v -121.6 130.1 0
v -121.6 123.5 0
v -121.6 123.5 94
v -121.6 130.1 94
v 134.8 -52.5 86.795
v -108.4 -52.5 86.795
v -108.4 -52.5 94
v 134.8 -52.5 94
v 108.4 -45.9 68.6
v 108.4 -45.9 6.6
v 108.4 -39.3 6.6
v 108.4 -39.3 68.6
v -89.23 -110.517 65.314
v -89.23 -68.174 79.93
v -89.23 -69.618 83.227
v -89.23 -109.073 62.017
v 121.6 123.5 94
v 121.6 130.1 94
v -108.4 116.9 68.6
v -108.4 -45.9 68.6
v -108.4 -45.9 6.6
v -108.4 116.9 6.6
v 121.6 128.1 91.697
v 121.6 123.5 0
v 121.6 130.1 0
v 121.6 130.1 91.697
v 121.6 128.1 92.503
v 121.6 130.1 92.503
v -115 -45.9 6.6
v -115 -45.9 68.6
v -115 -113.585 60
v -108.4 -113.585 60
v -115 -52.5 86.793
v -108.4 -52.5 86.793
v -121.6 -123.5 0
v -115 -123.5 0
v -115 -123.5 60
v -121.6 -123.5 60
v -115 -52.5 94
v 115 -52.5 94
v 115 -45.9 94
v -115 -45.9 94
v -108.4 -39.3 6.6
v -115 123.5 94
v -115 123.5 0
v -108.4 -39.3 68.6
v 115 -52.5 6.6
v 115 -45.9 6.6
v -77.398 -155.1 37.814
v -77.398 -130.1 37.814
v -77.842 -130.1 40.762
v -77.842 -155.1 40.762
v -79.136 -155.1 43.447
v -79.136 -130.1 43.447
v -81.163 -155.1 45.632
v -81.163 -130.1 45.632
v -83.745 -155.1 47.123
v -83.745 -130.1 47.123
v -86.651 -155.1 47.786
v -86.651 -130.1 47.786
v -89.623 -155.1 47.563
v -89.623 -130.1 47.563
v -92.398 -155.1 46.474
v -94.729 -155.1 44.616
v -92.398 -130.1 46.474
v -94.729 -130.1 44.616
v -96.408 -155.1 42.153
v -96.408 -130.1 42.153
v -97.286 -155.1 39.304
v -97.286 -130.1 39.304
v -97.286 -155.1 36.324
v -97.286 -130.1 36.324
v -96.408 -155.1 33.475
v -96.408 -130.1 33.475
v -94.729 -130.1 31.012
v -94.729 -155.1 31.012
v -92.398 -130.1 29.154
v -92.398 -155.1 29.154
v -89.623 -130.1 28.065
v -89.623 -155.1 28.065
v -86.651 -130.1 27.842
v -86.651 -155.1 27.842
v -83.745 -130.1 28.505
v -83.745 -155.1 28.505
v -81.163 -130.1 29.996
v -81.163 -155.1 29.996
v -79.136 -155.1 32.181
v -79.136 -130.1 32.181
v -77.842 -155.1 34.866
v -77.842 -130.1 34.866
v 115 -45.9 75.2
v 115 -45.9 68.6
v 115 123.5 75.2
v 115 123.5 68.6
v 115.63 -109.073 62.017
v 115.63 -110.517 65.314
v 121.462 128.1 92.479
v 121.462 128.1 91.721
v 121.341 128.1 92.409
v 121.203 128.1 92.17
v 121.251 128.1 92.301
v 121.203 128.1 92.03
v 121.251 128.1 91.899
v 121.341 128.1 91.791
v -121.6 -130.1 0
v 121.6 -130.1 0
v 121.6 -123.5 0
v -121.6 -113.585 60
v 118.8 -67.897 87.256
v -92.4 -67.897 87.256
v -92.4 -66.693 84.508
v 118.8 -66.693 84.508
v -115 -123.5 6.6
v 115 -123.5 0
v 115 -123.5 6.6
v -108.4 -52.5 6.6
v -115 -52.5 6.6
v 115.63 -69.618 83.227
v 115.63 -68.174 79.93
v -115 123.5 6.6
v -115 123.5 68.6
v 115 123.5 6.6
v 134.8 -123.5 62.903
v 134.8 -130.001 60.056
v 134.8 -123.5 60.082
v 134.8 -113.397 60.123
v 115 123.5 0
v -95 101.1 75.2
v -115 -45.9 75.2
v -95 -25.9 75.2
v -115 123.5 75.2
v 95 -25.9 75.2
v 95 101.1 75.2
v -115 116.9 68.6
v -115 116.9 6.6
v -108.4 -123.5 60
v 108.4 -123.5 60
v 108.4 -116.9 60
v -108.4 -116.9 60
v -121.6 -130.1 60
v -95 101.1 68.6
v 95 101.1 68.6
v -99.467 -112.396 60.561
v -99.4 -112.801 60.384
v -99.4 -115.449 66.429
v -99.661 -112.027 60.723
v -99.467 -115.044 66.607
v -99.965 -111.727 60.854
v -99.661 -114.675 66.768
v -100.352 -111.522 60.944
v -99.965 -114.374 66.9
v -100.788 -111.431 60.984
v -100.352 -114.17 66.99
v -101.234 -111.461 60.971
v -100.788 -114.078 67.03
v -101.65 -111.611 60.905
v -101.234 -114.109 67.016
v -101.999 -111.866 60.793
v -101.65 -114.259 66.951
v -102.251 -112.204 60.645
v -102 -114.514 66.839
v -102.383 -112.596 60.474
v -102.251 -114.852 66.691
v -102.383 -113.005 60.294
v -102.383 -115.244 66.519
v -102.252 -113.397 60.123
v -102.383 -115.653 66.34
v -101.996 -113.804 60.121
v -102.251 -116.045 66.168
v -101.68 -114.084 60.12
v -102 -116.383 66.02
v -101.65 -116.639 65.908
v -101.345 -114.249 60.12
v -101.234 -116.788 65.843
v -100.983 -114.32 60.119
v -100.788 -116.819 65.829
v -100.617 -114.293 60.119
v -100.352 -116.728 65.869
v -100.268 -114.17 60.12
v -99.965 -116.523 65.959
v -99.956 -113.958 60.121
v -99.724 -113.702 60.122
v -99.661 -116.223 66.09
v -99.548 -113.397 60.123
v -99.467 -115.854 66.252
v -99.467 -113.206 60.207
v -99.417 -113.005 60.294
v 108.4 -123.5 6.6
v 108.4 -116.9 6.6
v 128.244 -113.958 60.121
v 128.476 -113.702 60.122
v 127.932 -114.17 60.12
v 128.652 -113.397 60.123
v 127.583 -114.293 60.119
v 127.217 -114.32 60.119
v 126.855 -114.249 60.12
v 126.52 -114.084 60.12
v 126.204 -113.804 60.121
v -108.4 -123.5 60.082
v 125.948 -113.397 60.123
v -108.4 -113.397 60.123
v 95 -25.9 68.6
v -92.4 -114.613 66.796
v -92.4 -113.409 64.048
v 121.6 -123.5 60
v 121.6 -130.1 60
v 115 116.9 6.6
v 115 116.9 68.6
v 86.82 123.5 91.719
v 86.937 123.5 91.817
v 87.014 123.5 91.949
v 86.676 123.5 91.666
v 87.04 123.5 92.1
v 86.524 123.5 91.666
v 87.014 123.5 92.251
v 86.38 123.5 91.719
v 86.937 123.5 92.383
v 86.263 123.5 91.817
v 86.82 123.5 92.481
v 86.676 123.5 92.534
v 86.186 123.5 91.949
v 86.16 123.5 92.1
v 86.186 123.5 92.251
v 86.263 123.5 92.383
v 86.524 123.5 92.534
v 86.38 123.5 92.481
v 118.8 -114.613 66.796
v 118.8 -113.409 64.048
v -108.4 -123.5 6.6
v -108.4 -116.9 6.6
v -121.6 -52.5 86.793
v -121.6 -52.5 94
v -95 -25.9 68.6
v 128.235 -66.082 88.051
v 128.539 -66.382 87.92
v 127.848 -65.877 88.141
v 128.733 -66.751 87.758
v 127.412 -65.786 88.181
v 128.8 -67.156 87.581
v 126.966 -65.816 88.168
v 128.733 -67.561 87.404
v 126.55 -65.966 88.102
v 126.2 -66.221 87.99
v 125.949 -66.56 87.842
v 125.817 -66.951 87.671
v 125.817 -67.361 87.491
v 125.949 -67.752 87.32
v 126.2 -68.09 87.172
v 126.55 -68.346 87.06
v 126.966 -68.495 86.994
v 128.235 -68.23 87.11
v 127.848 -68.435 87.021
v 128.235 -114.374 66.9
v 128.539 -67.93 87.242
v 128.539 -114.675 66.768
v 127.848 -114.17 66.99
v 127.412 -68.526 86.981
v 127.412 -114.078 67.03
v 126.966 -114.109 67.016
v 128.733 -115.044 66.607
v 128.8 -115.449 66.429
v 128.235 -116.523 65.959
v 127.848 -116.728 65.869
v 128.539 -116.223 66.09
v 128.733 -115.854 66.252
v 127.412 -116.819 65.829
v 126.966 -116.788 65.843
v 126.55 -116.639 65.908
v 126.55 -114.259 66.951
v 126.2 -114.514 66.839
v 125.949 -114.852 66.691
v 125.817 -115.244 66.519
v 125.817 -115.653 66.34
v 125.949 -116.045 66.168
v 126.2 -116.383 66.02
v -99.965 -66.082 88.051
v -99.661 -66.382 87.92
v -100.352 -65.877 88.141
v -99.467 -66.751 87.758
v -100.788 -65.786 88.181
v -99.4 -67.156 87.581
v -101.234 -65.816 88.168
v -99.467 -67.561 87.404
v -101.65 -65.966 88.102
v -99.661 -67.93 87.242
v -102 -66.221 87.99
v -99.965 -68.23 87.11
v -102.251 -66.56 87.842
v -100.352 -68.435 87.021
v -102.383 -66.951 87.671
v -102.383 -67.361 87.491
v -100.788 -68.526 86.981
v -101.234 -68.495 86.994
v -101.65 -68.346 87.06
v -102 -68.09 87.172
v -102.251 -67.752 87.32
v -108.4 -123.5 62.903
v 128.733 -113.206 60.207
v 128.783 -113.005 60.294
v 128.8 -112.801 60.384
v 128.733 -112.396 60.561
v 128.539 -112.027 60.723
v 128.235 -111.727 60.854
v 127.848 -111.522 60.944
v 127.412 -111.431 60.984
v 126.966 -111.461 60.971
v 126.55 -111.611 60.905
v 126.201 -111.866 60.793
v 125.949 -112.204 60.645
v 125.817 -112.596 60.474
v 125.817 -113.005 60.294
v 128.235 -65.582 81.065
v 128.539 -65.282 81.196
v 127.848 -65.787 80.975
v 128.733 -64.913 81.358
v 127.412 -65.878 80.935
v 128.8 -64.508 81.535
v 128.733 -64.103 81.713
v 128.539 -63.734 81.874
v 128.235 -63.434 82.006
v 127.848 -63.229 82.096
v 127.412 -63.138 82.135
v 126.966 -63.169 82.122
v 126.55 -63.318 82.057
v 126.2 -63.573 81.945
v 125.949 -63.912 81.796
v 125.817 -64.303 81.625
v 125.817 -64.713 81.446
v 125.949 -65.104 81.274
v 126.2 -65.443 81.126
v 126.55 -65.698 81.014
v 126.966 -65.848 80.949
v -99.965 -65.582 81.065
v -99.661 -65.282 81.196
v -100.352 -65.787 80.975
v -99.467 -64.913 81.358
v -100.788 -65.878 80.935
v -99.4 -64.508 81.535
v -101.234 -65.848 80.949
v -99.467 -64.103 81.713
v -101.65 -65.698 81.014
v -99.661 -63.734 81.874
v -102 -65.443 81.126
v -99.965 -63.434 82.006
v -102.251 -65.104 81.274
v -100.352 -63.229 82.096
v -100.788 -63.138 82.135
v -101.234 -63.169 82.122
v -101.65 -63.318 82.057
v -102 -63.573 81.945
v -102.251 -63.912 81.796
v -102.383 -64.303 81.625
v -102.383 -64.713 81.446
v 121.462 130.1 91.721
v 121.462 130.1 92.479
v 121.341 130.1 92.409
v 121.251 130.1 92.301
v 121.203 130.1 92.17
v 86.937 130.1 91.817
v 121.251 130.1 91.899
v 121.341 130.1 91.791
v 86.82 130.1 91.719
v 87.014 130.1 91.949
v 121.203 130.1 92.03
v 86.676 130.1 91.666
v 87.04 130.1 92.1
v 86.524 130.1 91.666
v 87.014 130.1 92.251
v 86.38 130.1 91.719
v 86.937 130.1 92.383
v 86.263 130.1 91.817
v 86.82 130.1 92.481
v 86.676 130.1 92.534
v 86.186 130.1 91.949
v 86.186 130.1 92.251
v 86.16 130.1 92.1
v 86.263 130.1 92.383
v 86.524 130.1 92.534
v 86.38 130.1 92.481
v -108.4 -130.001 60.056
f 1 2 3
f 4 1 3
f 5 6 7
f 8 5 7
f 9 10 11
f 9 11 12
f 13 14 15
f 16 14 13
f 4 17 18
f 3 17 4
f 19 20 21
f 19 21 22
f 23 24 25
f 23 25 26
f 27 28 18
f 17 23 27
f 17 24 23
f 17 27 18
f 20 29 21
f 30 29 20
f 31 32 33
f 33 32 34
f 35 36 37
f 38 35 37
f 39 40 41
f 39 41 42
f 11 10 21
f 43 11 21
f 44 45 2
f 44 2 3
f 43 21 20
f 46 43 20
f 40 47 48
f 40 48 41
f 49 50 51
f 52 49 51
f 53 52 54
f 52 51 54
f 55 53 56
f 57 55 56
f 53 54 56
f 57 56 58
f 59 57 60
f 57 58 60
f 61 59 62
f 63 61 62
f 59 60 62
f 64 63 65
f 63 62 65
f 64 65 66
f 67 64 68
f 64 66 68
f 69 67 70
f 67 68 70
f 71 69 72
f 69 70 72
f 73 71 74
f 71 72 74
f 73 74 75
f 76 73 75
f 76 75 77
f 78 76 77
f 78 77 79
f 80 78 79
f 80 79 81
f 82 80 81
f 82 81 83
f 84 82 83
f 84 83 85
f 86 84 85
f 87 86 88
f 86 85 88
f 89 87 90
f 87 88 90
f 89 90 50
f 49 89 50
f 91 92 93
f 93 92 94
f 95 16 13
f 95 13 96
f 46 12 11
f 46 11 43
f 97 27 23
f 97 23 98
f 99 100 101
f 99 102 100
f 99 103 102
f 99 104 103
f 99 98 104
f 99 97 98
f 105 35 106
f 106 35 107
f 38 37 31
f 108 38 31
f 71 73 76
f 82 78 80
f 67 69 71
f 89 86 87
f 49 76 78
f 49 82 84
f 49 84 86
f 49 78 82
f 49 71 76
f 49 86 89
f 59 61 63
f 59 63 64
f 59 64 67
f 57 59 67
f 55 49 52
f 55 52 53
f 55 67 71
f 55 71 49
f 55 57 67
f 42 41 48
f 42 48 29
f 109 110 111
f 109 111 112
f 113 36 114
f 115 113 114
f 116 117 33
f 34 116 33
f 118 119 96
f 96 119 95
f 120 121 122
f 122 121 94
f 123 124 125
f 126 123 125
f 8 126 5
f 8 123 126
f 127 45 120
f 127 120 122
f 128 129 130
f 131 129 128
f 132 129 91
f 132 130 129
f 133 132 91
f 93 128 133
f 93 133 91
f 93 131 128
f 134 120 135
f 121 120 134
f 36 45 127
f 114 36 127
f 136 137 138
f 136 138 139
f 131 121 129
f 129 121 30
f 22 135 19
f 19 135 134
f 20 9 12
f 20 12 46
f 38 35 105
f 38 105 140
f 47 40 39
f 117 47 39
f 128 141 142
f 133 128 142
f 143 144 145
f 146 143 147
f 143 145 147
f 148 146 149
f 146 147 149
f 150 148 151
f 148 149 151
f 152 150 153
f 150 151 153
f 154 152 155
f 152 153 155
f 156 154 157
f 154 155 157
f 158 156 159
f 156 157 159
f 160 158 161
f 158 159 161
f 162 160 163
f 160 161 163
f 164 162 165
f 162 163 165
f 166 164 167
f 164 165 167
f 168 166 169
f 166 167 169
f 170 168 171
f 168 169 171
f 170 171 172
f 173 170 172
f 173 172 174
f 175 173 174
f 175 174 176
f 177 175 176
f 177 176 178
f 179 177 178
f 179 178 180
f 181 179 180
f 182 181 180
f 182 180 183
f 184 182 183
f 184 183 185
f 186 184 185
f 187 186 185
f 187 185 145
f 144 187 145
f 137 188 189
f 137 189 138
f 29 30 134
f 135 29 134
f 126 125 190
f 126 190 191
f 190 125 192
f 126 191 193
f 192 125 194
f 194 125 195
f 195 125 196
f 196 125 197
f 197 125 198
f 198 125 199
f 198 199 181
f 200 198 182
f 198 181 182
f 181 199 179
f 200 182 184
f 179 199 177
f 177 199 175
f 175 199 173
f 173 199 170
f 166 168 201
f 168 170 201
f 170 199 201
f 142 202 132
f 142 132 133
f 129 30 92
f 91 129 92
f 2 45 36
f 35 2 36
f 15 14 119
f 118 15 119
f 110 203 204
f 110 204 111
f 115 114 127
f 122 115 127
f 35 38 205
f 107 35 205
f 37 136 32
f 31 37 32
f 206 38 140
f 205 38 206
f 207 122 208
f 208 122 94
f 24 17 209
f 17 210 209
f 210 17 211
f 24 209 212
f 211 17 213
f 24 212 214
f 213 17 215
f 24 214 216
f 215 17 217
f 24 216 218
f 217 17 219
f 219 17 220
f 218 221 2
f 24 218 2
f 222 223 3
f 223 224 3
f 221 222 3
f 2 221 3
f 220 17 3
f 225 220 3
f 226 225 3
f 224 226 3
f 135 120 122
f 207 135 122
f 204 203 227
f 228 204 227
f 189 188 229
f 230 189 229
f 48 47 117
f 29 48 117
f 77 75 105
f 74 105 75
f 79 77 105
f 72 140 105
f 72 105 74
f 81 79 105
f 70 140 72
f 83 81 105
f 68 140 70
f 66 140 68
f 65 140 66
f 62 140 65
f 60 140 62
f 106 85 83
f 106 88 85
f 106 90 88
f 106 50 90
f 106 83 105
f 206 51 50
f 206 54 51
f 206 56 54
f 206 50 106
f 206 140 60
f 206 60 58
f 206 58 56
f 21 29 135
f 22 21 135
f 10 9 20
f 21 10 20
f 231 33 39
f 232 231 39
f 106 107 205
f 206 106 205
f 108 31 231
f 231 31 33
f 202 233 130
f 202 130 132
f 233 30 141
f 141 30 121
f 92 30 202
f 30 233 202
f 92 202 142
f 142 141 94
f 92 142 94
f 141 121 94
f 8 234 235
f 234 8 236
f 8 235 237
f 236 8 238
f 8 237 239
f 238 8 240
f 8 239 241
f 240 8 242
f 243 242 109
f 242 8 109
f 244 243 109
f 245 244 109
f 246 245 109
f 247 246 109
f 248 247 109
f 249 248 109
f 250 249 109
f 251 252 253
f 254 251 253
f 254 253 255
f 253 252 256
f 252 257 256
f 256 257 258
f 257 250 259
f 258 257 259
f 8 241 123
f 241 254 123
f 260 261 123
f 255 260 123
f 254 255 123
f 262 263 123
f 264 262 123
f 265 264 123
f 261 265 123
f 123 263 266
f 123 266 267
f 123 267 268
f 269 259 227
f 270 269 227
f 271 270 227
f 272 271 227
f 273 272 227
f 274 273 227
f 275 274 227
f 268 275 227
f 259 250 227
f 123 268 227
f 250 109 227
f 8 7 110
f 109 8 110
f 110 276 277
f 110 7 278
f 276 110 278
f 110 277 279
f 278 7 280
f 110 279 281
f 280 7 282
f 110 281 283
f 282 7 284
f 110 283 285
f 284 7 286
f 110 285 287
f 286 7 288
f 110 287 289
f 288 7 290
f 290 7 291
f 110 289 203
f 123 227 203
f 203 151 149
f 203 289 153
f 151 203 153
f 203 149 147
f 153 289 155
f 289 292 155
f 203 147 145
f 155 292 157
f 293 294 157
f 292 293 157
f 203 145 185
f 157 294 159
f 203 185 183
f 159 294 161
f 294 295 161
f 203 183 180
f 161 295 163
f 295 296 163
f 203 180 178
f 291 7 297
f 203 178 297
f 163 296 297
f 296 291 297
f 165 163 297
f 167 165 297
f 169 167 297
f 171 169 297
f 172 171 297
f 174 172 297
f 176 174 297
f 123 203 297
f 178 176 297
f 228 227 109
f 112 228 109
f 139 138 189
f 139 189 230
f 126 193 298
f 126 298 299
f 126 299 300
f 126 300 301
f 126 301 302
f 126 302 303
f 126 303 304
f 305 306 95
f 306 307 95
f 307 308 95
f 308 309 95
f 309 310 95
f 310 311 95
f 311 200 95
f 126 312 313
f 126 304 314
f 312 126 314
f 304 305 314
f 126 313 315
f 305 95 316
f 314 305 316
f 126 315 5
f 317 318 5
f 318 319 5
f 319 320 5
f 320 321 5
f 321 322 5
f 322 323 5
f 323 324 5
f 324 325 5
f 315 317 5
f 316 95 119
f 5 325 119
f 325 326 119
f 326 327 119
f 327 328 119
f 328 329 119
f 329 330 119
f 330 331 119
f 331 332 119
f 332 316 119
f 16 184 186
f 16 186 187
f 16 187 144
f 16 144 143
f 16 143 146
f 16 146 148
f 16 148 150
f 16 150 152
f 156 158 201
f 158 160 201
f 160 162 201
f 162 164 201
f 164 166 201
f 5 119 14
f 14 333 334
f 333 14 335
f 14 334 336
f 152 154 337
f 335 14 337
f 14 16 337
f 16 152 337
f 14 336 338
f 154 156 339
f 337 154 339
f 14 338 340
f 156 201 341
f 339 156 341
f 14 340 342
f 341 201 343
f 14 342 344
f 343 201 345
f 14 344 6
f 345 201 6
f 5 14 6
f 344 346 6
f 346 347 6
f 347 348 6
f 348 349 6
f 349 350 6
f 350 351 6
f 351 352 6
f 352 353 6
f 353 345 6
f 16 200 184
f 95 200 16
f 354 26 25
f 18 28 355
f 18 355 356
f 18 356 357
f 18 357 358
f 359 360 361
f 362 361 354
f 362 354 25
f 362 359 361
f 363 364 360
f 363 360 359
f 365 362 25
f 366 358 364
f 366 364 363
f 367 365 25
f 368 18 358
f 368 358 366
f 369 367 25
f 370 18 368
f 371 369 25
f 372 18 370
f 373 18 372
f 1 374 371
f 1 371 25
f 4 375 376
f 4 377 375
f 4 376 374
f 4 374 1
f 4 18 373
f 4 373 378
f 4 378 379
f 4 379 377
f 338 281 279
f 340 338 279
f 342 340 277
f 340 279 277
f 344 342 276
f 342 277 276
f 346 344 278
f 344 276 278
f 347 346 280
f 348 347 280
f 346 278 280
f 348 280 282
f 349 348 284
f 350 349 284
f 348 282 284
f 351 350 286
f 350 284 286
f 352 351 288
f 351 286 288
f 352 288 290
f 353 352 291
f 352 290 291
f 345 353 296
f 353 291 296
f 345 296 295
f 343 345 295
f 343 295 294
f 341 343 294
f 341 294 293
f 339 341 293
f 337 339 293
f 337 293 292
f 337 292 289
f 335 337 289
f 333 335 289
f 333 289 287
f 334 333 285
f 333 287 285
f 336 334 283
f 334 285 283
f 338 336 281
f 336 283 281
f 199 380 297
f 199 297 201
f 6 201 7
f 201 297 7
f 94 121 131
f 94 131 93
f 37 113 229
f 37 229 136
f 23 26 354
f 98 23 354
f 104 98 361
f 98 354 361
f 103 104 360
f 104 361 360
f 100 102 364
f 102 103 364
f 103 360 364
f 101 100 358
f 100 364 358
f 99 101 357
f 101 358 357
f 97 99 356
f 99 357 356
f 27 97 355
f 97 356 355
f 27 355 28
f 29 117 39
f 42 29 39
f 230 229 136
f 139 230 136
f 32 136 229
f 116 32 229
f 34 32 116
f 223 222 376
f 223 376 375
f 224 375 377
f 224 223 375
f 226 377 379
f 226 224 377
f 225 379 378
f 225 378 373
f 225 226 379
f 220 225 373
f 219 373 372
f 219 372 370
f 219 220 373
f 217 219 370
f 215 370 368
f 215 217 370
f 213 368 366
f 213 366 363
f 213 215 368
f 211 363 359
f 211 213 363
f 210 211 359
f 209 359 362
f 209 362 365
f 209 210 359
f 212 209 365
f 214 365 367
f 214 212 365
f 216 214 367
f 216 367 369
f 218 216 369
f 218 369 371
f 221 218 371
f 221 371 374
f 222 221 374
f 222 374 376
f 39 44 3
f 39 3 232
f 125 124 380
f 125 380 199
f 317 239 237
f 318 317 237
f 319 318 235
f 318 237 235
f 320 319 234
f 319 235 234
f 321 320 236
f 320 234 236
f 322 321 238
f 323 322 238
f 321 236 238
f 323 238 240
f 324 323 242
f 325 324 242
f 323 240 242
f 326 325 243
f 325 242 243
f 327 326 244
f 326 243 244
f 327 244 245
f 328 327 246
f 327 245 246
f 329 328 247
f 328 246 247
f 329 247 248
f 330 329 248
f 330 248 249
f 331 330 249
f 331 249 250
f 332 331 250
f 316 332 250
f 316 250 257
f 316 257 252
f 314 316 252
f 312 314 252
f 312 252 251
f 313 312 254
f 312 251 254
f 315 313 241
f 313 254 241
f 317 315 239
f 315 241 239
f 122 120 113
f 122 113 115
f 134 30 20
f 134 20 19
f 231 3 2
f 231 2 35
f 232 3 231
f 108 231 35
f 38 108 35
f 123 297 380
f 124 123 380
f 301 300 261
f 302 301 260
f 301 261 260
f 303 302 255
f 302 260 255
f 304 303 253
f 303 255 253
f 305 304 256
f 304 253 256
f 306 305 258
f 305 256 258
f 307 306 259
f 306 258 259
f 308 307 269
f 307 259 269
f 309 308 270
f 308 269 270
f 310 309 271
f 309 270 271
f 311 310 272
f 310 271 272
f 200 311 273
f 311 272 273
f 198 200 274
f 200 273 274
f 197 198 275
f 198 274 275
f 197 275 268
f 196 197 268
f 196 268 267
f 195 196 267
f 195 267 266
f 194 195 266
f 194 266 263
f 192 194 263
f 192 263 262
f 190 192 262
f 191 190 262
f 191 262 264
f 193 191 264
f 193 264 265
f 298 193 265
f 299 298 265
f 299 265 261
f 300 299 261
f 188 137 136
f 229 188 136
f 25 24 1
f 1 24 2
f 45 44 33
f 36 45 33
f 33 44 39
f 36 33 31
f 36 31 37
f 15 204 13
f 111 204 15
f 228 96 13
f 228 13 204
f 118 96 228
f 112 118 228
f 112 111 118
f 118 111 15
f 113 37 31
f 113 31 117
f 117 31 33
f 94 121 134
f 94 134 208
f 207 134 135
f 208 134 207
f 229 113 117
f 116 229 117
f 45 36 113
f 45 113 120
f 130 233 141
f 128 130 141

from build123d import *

# Parameters (mm, degrees)
F0_W      = 230
F0_H      = 247
F1_DEPTH  = 6.6
F2_W      = 243.2
F2_H      = 94
F2_R      = 0.4403166593
F3_DEPTH  = 6.6
F4_W      = 247
F4_H      = 94
F5_DEPTH  = 6.6
F6_W      = 230
F6_H      = 62
F7_DEPTH  = 6.6
F8_W      = 243.2
F8_H      = 60
F9_DEPTH  = 6.6
F10_W     = 71
F10_H     = 87.4
F11_DEPTH = 6.6
F12_W     = 230
F12_H     = 87.4
F13_DEPTH = 6.6
F14_R     = 0.402989406
F15_DEPTH = 2
F16_W     = 162.8
F16_H     = 62
F17_DEPTH = 6.6
F18_W     = 216.8
F18_H     = 62
F19_DEPTH = 6.6
F20_W     = 230
F20_H     = 162.8
F20_W_2   = 190
F20_H_2   = 127
F20_H_3   = 6.6
F21_DEPTH = 6.6
F22_W     = 216.8
F22_H     = 53.4
F23_DEPTH = 6.6
F25_DEPTH = 243.2
F27_DEPTH = 25
F28_DEPTH = 25
F29_W     = 204.86
F29_H     = 44.65
F30_DEPTH = 37.7334511403
F31_W     = 211.2
F31_H     = 51
F32_DEPTH = 3
F33_R     = 1.5
F34_DEPTH = 6.6
F35_R     = 10
F36_DEPTH = 25


with BuildPart() as f1:
    # F0 (on Top) → F1 (new body)
    with BuildSketch(Plane.XY):
        Rectangle(F0_W, F0_H)
    extrude(amount=F1_DEPTH)

    # F26 (on face) → F28 (cut)
    with BuildSketch(Plane.YZ.offset(-108.4)):
        Polygon((-52.5, 86.7930374113), (-52.5, 94), (-123.5, 62.8581471056), (-130.0162610969, 60), (-113.585178928, 60), align=None)
        Polygon((-123.5, 62.8581471056), (-52.5, 94), (-123.5, 94), align=None)
    extrude(amount=-F28_DEPTH, mode=Mode.SUBTRACT)


with BuildPart() as f3:
    # F2 (on face) → F3 (new body)
    with BuildSketch(Plane(origin=(0, 123.5, 0), x_dir=(-1, 0, 0), z_dir=(0, 1, 0))):
        with Locations((0, 47)):
            Rectangle(F2_W, F2_H)
        with Locations((-86.6, 92.1)):
            Circle(F2_R, mode=Mode.SUBTRACT)
    extrude(amount=F3_DEPTH)

    # F14 (on face) → F15 (cut)
    with BuildSketch(Plane(origin=(0, 130.1, 0), x_dir=(-1, 0, 0), z_dir=(0, 1, 0))):
        with Locations((-121.6, 92.1)):
            Circle(F14_R)
    extrude(amount=-F15_DEPTH, mode=Mode.SUBTRACT)


with BuildPart() as f5:
    # F4 (on face) → F5 (new body)
    with BuildSketch(Plane(origin=(-115, 0, 0), x_dir=(0, -1, 0), z_dir=(-1, 0, 0))):
        with Locations((0, 47)):
            Rectangle(F4_W, F4_H)
    extrude(amount=F5_DEPTH)


with BuildPart() as f7:
    # F6 (on face) → F7 (new body)
    with BuildSketch(Plane.XZ.offset(-123.5)):
        with Locations((0, 37.6)):
            Rectangle(F6_W, F6_H)
    extrude(amount=F7_DEPTH)


with BuildPart() as f9:
    # F8 (on face) → F9 (new body)
    with BuildSketch(Plane.XZ.offset(123.5)):
        with Locations((0, 30)):
            Rectangle(F8_W, F8_H)
    extrude(amount=F9_DEPTH)

    # F35 (on face) → F36 (join)
    with BuildSketch(Plane.XZ.offset(130.1)):
        with Locations((-87.3980596662, 37.8140471876)):
            Circle(F35_R)
    extrude(amount=F36_DEPTH)


with BuildPart() as f11:
    # F10 (on face) → F11 (new body)
    with BuildSketch(Plane.YZ.offset(-115)):
        with Locations((-88, 50.3)):
            Rectangle(F10_W, F10_H)
    extrude(amount=F11_DEPTH)


with BuildPart() as f13:
    # F12 (on face) → F13 (new body)
    with BuildSketch(Plane(origin=(0, -52.5, 0), x_dir=(-1, 0, 0), z_dir=(0, 1, 0))):
        with Locations((0, 50.3)):
            Rectangle(F12_W, F12_H)
    extrude(amount=F13_DEPTH)


with BuildPart() as f17:
    # F16 (on face) → F17 (new body)
    with BuildSketch(Plane.YZ.offset(-115)):
        with Locations((35.5, 37.6)):
            Rectangle(F16_W, F16_H)
    extrude(amount=F17_DEPTH)


with BuildPart() as f19:
    # F18 (on face) → F19 (new body)
    with BuildSketch(Plane(origin=(0, -45.9, 0), x_dir=(-1, 0, 0), z_dir=(0, 1, 0))):
        with Locations((0, 37.6)):
            Rectangle(F18_W, F18_H)
    extrude(amount=F19_DEPTH)


with BuildPart() as f21:
    # F20 (on face) → F21 (new body)
    with BuildSketch(Plane.XY.offset(68.6)):
        with Locations((0, 35.5)):
            Rectangle(F20_W, F20_H)
        with Locations((0, 37.6)):
            Rectangle(F20_W_2, F20_H_2, mode=Mode.SUBTRACT)
        with Locations((0, 120.2)):
            Rectangle(F20_W, F20_H_3)
    extrude(amount=F21_DEPTH)


with BuildPart() as f23:
    # F22 (on face) → F23 (new body)
    with BuildSketch(Plane(origin=(0, -123.5, 0), x_dir=(-1, 0, 0), z_dir=(0, 1, 0))):
        with Locations((0, 33.3)):
            Rectangle(F22_W, F22_H)
    extrude(amount=F23_DEPTH)


with BuildPart() as f25:
    # F24 (on face) → F25 (new body)
    with BuildSketch(Plane.YZ.offset(-108.4)):
        Polygon((-123.5, 60.081971369), (-113.3965536834, 60.1229617272), (-52.5, 86.7947146387), (-52.5, 94), (-123.5, 62.9030931608), align=None)
        Polygon((-130.0013661385, 60.0555948913), (-123.5, 60.081971369), (-123.5, 62.9030931608), align=None)
    extrude(amount=F25_DEPTH)

    # F29 (on face) → F30 (cut, through all)
    with BuildSketch(Plane(origin=(0, -40.3462153981, 92.1178851671), x_dir=(1, 0, 0), z_dir=(0, 0.4011913807, -0.9159942555))):
        with Locations((13.2, 52.7047777396)):
            Rectangle(F29_W, F29_H)
    extrude(amount=-F30_DEPTH, mode=Mode.SUBTRACT)

    # F31 (on face) → F32 (cut)
    with BuildSketch(Plane(origin=(0, -42.9940785105, 98.1634472532), x_dir=(1, 0, 0), z_dir=(0, -0.4011913807, 0.9159942555))):
        with Locations((13.2, -52.6867175557)):
            Rectangle(F31_W, F31_H)
    extrude(amount=-F32_DEPTH, mode=Mode.SUBTRACT)

    # F33 (on face) → F34 (cut)
    with BuildSketch(Plane(origin=(0, -42.9940785105, 98.1634472532), x_dir=(1, 0, 0), z_dir=(0, -0.4011913807, 0.9159942555))):
        with Locations((-100.9, -79.0993697975)):
            Circle(F33_R)
        with Locations((-100.9, -26.3777086293)):
            Circle(F33_R)
        with Locations((127.3, -26.3777086293)):
            Circle(F33_R)
        with Locations((127.3, -79.0993697975)):
            Circle(F33_R)
    extrude(amount=-F34_DEPTH, mode=Mode.SUBTRACT)


with BuildPart() as f27_tool:
    # F26 (on face) → F27 (new body)
    with BuildSketch(Plane.YZ.offset(-108.4)):
        Polygon((-52.5, 86.7930374113), (-52.5, 94), (-123.5, 62.8581471056), (-130.0162610969, 60), (-113.585178928, 60), align=None)
        Polygon((-123.5, 62.8581471056), (-52.5, 94), (-123.5, 94), align=None)
    extrude(amount=-F27_DEPTH)


with BuildPart() as f5_1:
    add(f5.part)

    # F27: cut by f27_tool
    add(f27_tool.part, mode=Mode.SUBTRACT)


with BuildPart() as f11_1:
    add(f11.part)

    # F27: cut by f27_tool
    add(f27_tool.part, mode=Mode.SUBTRACT)


solid = Compound([f1.part, f3.part, f7.part, f9.part, f13.part, f17.part, f19.part, f21.part, f23.part, f25.part, f5_1.part, f11_1.part])
